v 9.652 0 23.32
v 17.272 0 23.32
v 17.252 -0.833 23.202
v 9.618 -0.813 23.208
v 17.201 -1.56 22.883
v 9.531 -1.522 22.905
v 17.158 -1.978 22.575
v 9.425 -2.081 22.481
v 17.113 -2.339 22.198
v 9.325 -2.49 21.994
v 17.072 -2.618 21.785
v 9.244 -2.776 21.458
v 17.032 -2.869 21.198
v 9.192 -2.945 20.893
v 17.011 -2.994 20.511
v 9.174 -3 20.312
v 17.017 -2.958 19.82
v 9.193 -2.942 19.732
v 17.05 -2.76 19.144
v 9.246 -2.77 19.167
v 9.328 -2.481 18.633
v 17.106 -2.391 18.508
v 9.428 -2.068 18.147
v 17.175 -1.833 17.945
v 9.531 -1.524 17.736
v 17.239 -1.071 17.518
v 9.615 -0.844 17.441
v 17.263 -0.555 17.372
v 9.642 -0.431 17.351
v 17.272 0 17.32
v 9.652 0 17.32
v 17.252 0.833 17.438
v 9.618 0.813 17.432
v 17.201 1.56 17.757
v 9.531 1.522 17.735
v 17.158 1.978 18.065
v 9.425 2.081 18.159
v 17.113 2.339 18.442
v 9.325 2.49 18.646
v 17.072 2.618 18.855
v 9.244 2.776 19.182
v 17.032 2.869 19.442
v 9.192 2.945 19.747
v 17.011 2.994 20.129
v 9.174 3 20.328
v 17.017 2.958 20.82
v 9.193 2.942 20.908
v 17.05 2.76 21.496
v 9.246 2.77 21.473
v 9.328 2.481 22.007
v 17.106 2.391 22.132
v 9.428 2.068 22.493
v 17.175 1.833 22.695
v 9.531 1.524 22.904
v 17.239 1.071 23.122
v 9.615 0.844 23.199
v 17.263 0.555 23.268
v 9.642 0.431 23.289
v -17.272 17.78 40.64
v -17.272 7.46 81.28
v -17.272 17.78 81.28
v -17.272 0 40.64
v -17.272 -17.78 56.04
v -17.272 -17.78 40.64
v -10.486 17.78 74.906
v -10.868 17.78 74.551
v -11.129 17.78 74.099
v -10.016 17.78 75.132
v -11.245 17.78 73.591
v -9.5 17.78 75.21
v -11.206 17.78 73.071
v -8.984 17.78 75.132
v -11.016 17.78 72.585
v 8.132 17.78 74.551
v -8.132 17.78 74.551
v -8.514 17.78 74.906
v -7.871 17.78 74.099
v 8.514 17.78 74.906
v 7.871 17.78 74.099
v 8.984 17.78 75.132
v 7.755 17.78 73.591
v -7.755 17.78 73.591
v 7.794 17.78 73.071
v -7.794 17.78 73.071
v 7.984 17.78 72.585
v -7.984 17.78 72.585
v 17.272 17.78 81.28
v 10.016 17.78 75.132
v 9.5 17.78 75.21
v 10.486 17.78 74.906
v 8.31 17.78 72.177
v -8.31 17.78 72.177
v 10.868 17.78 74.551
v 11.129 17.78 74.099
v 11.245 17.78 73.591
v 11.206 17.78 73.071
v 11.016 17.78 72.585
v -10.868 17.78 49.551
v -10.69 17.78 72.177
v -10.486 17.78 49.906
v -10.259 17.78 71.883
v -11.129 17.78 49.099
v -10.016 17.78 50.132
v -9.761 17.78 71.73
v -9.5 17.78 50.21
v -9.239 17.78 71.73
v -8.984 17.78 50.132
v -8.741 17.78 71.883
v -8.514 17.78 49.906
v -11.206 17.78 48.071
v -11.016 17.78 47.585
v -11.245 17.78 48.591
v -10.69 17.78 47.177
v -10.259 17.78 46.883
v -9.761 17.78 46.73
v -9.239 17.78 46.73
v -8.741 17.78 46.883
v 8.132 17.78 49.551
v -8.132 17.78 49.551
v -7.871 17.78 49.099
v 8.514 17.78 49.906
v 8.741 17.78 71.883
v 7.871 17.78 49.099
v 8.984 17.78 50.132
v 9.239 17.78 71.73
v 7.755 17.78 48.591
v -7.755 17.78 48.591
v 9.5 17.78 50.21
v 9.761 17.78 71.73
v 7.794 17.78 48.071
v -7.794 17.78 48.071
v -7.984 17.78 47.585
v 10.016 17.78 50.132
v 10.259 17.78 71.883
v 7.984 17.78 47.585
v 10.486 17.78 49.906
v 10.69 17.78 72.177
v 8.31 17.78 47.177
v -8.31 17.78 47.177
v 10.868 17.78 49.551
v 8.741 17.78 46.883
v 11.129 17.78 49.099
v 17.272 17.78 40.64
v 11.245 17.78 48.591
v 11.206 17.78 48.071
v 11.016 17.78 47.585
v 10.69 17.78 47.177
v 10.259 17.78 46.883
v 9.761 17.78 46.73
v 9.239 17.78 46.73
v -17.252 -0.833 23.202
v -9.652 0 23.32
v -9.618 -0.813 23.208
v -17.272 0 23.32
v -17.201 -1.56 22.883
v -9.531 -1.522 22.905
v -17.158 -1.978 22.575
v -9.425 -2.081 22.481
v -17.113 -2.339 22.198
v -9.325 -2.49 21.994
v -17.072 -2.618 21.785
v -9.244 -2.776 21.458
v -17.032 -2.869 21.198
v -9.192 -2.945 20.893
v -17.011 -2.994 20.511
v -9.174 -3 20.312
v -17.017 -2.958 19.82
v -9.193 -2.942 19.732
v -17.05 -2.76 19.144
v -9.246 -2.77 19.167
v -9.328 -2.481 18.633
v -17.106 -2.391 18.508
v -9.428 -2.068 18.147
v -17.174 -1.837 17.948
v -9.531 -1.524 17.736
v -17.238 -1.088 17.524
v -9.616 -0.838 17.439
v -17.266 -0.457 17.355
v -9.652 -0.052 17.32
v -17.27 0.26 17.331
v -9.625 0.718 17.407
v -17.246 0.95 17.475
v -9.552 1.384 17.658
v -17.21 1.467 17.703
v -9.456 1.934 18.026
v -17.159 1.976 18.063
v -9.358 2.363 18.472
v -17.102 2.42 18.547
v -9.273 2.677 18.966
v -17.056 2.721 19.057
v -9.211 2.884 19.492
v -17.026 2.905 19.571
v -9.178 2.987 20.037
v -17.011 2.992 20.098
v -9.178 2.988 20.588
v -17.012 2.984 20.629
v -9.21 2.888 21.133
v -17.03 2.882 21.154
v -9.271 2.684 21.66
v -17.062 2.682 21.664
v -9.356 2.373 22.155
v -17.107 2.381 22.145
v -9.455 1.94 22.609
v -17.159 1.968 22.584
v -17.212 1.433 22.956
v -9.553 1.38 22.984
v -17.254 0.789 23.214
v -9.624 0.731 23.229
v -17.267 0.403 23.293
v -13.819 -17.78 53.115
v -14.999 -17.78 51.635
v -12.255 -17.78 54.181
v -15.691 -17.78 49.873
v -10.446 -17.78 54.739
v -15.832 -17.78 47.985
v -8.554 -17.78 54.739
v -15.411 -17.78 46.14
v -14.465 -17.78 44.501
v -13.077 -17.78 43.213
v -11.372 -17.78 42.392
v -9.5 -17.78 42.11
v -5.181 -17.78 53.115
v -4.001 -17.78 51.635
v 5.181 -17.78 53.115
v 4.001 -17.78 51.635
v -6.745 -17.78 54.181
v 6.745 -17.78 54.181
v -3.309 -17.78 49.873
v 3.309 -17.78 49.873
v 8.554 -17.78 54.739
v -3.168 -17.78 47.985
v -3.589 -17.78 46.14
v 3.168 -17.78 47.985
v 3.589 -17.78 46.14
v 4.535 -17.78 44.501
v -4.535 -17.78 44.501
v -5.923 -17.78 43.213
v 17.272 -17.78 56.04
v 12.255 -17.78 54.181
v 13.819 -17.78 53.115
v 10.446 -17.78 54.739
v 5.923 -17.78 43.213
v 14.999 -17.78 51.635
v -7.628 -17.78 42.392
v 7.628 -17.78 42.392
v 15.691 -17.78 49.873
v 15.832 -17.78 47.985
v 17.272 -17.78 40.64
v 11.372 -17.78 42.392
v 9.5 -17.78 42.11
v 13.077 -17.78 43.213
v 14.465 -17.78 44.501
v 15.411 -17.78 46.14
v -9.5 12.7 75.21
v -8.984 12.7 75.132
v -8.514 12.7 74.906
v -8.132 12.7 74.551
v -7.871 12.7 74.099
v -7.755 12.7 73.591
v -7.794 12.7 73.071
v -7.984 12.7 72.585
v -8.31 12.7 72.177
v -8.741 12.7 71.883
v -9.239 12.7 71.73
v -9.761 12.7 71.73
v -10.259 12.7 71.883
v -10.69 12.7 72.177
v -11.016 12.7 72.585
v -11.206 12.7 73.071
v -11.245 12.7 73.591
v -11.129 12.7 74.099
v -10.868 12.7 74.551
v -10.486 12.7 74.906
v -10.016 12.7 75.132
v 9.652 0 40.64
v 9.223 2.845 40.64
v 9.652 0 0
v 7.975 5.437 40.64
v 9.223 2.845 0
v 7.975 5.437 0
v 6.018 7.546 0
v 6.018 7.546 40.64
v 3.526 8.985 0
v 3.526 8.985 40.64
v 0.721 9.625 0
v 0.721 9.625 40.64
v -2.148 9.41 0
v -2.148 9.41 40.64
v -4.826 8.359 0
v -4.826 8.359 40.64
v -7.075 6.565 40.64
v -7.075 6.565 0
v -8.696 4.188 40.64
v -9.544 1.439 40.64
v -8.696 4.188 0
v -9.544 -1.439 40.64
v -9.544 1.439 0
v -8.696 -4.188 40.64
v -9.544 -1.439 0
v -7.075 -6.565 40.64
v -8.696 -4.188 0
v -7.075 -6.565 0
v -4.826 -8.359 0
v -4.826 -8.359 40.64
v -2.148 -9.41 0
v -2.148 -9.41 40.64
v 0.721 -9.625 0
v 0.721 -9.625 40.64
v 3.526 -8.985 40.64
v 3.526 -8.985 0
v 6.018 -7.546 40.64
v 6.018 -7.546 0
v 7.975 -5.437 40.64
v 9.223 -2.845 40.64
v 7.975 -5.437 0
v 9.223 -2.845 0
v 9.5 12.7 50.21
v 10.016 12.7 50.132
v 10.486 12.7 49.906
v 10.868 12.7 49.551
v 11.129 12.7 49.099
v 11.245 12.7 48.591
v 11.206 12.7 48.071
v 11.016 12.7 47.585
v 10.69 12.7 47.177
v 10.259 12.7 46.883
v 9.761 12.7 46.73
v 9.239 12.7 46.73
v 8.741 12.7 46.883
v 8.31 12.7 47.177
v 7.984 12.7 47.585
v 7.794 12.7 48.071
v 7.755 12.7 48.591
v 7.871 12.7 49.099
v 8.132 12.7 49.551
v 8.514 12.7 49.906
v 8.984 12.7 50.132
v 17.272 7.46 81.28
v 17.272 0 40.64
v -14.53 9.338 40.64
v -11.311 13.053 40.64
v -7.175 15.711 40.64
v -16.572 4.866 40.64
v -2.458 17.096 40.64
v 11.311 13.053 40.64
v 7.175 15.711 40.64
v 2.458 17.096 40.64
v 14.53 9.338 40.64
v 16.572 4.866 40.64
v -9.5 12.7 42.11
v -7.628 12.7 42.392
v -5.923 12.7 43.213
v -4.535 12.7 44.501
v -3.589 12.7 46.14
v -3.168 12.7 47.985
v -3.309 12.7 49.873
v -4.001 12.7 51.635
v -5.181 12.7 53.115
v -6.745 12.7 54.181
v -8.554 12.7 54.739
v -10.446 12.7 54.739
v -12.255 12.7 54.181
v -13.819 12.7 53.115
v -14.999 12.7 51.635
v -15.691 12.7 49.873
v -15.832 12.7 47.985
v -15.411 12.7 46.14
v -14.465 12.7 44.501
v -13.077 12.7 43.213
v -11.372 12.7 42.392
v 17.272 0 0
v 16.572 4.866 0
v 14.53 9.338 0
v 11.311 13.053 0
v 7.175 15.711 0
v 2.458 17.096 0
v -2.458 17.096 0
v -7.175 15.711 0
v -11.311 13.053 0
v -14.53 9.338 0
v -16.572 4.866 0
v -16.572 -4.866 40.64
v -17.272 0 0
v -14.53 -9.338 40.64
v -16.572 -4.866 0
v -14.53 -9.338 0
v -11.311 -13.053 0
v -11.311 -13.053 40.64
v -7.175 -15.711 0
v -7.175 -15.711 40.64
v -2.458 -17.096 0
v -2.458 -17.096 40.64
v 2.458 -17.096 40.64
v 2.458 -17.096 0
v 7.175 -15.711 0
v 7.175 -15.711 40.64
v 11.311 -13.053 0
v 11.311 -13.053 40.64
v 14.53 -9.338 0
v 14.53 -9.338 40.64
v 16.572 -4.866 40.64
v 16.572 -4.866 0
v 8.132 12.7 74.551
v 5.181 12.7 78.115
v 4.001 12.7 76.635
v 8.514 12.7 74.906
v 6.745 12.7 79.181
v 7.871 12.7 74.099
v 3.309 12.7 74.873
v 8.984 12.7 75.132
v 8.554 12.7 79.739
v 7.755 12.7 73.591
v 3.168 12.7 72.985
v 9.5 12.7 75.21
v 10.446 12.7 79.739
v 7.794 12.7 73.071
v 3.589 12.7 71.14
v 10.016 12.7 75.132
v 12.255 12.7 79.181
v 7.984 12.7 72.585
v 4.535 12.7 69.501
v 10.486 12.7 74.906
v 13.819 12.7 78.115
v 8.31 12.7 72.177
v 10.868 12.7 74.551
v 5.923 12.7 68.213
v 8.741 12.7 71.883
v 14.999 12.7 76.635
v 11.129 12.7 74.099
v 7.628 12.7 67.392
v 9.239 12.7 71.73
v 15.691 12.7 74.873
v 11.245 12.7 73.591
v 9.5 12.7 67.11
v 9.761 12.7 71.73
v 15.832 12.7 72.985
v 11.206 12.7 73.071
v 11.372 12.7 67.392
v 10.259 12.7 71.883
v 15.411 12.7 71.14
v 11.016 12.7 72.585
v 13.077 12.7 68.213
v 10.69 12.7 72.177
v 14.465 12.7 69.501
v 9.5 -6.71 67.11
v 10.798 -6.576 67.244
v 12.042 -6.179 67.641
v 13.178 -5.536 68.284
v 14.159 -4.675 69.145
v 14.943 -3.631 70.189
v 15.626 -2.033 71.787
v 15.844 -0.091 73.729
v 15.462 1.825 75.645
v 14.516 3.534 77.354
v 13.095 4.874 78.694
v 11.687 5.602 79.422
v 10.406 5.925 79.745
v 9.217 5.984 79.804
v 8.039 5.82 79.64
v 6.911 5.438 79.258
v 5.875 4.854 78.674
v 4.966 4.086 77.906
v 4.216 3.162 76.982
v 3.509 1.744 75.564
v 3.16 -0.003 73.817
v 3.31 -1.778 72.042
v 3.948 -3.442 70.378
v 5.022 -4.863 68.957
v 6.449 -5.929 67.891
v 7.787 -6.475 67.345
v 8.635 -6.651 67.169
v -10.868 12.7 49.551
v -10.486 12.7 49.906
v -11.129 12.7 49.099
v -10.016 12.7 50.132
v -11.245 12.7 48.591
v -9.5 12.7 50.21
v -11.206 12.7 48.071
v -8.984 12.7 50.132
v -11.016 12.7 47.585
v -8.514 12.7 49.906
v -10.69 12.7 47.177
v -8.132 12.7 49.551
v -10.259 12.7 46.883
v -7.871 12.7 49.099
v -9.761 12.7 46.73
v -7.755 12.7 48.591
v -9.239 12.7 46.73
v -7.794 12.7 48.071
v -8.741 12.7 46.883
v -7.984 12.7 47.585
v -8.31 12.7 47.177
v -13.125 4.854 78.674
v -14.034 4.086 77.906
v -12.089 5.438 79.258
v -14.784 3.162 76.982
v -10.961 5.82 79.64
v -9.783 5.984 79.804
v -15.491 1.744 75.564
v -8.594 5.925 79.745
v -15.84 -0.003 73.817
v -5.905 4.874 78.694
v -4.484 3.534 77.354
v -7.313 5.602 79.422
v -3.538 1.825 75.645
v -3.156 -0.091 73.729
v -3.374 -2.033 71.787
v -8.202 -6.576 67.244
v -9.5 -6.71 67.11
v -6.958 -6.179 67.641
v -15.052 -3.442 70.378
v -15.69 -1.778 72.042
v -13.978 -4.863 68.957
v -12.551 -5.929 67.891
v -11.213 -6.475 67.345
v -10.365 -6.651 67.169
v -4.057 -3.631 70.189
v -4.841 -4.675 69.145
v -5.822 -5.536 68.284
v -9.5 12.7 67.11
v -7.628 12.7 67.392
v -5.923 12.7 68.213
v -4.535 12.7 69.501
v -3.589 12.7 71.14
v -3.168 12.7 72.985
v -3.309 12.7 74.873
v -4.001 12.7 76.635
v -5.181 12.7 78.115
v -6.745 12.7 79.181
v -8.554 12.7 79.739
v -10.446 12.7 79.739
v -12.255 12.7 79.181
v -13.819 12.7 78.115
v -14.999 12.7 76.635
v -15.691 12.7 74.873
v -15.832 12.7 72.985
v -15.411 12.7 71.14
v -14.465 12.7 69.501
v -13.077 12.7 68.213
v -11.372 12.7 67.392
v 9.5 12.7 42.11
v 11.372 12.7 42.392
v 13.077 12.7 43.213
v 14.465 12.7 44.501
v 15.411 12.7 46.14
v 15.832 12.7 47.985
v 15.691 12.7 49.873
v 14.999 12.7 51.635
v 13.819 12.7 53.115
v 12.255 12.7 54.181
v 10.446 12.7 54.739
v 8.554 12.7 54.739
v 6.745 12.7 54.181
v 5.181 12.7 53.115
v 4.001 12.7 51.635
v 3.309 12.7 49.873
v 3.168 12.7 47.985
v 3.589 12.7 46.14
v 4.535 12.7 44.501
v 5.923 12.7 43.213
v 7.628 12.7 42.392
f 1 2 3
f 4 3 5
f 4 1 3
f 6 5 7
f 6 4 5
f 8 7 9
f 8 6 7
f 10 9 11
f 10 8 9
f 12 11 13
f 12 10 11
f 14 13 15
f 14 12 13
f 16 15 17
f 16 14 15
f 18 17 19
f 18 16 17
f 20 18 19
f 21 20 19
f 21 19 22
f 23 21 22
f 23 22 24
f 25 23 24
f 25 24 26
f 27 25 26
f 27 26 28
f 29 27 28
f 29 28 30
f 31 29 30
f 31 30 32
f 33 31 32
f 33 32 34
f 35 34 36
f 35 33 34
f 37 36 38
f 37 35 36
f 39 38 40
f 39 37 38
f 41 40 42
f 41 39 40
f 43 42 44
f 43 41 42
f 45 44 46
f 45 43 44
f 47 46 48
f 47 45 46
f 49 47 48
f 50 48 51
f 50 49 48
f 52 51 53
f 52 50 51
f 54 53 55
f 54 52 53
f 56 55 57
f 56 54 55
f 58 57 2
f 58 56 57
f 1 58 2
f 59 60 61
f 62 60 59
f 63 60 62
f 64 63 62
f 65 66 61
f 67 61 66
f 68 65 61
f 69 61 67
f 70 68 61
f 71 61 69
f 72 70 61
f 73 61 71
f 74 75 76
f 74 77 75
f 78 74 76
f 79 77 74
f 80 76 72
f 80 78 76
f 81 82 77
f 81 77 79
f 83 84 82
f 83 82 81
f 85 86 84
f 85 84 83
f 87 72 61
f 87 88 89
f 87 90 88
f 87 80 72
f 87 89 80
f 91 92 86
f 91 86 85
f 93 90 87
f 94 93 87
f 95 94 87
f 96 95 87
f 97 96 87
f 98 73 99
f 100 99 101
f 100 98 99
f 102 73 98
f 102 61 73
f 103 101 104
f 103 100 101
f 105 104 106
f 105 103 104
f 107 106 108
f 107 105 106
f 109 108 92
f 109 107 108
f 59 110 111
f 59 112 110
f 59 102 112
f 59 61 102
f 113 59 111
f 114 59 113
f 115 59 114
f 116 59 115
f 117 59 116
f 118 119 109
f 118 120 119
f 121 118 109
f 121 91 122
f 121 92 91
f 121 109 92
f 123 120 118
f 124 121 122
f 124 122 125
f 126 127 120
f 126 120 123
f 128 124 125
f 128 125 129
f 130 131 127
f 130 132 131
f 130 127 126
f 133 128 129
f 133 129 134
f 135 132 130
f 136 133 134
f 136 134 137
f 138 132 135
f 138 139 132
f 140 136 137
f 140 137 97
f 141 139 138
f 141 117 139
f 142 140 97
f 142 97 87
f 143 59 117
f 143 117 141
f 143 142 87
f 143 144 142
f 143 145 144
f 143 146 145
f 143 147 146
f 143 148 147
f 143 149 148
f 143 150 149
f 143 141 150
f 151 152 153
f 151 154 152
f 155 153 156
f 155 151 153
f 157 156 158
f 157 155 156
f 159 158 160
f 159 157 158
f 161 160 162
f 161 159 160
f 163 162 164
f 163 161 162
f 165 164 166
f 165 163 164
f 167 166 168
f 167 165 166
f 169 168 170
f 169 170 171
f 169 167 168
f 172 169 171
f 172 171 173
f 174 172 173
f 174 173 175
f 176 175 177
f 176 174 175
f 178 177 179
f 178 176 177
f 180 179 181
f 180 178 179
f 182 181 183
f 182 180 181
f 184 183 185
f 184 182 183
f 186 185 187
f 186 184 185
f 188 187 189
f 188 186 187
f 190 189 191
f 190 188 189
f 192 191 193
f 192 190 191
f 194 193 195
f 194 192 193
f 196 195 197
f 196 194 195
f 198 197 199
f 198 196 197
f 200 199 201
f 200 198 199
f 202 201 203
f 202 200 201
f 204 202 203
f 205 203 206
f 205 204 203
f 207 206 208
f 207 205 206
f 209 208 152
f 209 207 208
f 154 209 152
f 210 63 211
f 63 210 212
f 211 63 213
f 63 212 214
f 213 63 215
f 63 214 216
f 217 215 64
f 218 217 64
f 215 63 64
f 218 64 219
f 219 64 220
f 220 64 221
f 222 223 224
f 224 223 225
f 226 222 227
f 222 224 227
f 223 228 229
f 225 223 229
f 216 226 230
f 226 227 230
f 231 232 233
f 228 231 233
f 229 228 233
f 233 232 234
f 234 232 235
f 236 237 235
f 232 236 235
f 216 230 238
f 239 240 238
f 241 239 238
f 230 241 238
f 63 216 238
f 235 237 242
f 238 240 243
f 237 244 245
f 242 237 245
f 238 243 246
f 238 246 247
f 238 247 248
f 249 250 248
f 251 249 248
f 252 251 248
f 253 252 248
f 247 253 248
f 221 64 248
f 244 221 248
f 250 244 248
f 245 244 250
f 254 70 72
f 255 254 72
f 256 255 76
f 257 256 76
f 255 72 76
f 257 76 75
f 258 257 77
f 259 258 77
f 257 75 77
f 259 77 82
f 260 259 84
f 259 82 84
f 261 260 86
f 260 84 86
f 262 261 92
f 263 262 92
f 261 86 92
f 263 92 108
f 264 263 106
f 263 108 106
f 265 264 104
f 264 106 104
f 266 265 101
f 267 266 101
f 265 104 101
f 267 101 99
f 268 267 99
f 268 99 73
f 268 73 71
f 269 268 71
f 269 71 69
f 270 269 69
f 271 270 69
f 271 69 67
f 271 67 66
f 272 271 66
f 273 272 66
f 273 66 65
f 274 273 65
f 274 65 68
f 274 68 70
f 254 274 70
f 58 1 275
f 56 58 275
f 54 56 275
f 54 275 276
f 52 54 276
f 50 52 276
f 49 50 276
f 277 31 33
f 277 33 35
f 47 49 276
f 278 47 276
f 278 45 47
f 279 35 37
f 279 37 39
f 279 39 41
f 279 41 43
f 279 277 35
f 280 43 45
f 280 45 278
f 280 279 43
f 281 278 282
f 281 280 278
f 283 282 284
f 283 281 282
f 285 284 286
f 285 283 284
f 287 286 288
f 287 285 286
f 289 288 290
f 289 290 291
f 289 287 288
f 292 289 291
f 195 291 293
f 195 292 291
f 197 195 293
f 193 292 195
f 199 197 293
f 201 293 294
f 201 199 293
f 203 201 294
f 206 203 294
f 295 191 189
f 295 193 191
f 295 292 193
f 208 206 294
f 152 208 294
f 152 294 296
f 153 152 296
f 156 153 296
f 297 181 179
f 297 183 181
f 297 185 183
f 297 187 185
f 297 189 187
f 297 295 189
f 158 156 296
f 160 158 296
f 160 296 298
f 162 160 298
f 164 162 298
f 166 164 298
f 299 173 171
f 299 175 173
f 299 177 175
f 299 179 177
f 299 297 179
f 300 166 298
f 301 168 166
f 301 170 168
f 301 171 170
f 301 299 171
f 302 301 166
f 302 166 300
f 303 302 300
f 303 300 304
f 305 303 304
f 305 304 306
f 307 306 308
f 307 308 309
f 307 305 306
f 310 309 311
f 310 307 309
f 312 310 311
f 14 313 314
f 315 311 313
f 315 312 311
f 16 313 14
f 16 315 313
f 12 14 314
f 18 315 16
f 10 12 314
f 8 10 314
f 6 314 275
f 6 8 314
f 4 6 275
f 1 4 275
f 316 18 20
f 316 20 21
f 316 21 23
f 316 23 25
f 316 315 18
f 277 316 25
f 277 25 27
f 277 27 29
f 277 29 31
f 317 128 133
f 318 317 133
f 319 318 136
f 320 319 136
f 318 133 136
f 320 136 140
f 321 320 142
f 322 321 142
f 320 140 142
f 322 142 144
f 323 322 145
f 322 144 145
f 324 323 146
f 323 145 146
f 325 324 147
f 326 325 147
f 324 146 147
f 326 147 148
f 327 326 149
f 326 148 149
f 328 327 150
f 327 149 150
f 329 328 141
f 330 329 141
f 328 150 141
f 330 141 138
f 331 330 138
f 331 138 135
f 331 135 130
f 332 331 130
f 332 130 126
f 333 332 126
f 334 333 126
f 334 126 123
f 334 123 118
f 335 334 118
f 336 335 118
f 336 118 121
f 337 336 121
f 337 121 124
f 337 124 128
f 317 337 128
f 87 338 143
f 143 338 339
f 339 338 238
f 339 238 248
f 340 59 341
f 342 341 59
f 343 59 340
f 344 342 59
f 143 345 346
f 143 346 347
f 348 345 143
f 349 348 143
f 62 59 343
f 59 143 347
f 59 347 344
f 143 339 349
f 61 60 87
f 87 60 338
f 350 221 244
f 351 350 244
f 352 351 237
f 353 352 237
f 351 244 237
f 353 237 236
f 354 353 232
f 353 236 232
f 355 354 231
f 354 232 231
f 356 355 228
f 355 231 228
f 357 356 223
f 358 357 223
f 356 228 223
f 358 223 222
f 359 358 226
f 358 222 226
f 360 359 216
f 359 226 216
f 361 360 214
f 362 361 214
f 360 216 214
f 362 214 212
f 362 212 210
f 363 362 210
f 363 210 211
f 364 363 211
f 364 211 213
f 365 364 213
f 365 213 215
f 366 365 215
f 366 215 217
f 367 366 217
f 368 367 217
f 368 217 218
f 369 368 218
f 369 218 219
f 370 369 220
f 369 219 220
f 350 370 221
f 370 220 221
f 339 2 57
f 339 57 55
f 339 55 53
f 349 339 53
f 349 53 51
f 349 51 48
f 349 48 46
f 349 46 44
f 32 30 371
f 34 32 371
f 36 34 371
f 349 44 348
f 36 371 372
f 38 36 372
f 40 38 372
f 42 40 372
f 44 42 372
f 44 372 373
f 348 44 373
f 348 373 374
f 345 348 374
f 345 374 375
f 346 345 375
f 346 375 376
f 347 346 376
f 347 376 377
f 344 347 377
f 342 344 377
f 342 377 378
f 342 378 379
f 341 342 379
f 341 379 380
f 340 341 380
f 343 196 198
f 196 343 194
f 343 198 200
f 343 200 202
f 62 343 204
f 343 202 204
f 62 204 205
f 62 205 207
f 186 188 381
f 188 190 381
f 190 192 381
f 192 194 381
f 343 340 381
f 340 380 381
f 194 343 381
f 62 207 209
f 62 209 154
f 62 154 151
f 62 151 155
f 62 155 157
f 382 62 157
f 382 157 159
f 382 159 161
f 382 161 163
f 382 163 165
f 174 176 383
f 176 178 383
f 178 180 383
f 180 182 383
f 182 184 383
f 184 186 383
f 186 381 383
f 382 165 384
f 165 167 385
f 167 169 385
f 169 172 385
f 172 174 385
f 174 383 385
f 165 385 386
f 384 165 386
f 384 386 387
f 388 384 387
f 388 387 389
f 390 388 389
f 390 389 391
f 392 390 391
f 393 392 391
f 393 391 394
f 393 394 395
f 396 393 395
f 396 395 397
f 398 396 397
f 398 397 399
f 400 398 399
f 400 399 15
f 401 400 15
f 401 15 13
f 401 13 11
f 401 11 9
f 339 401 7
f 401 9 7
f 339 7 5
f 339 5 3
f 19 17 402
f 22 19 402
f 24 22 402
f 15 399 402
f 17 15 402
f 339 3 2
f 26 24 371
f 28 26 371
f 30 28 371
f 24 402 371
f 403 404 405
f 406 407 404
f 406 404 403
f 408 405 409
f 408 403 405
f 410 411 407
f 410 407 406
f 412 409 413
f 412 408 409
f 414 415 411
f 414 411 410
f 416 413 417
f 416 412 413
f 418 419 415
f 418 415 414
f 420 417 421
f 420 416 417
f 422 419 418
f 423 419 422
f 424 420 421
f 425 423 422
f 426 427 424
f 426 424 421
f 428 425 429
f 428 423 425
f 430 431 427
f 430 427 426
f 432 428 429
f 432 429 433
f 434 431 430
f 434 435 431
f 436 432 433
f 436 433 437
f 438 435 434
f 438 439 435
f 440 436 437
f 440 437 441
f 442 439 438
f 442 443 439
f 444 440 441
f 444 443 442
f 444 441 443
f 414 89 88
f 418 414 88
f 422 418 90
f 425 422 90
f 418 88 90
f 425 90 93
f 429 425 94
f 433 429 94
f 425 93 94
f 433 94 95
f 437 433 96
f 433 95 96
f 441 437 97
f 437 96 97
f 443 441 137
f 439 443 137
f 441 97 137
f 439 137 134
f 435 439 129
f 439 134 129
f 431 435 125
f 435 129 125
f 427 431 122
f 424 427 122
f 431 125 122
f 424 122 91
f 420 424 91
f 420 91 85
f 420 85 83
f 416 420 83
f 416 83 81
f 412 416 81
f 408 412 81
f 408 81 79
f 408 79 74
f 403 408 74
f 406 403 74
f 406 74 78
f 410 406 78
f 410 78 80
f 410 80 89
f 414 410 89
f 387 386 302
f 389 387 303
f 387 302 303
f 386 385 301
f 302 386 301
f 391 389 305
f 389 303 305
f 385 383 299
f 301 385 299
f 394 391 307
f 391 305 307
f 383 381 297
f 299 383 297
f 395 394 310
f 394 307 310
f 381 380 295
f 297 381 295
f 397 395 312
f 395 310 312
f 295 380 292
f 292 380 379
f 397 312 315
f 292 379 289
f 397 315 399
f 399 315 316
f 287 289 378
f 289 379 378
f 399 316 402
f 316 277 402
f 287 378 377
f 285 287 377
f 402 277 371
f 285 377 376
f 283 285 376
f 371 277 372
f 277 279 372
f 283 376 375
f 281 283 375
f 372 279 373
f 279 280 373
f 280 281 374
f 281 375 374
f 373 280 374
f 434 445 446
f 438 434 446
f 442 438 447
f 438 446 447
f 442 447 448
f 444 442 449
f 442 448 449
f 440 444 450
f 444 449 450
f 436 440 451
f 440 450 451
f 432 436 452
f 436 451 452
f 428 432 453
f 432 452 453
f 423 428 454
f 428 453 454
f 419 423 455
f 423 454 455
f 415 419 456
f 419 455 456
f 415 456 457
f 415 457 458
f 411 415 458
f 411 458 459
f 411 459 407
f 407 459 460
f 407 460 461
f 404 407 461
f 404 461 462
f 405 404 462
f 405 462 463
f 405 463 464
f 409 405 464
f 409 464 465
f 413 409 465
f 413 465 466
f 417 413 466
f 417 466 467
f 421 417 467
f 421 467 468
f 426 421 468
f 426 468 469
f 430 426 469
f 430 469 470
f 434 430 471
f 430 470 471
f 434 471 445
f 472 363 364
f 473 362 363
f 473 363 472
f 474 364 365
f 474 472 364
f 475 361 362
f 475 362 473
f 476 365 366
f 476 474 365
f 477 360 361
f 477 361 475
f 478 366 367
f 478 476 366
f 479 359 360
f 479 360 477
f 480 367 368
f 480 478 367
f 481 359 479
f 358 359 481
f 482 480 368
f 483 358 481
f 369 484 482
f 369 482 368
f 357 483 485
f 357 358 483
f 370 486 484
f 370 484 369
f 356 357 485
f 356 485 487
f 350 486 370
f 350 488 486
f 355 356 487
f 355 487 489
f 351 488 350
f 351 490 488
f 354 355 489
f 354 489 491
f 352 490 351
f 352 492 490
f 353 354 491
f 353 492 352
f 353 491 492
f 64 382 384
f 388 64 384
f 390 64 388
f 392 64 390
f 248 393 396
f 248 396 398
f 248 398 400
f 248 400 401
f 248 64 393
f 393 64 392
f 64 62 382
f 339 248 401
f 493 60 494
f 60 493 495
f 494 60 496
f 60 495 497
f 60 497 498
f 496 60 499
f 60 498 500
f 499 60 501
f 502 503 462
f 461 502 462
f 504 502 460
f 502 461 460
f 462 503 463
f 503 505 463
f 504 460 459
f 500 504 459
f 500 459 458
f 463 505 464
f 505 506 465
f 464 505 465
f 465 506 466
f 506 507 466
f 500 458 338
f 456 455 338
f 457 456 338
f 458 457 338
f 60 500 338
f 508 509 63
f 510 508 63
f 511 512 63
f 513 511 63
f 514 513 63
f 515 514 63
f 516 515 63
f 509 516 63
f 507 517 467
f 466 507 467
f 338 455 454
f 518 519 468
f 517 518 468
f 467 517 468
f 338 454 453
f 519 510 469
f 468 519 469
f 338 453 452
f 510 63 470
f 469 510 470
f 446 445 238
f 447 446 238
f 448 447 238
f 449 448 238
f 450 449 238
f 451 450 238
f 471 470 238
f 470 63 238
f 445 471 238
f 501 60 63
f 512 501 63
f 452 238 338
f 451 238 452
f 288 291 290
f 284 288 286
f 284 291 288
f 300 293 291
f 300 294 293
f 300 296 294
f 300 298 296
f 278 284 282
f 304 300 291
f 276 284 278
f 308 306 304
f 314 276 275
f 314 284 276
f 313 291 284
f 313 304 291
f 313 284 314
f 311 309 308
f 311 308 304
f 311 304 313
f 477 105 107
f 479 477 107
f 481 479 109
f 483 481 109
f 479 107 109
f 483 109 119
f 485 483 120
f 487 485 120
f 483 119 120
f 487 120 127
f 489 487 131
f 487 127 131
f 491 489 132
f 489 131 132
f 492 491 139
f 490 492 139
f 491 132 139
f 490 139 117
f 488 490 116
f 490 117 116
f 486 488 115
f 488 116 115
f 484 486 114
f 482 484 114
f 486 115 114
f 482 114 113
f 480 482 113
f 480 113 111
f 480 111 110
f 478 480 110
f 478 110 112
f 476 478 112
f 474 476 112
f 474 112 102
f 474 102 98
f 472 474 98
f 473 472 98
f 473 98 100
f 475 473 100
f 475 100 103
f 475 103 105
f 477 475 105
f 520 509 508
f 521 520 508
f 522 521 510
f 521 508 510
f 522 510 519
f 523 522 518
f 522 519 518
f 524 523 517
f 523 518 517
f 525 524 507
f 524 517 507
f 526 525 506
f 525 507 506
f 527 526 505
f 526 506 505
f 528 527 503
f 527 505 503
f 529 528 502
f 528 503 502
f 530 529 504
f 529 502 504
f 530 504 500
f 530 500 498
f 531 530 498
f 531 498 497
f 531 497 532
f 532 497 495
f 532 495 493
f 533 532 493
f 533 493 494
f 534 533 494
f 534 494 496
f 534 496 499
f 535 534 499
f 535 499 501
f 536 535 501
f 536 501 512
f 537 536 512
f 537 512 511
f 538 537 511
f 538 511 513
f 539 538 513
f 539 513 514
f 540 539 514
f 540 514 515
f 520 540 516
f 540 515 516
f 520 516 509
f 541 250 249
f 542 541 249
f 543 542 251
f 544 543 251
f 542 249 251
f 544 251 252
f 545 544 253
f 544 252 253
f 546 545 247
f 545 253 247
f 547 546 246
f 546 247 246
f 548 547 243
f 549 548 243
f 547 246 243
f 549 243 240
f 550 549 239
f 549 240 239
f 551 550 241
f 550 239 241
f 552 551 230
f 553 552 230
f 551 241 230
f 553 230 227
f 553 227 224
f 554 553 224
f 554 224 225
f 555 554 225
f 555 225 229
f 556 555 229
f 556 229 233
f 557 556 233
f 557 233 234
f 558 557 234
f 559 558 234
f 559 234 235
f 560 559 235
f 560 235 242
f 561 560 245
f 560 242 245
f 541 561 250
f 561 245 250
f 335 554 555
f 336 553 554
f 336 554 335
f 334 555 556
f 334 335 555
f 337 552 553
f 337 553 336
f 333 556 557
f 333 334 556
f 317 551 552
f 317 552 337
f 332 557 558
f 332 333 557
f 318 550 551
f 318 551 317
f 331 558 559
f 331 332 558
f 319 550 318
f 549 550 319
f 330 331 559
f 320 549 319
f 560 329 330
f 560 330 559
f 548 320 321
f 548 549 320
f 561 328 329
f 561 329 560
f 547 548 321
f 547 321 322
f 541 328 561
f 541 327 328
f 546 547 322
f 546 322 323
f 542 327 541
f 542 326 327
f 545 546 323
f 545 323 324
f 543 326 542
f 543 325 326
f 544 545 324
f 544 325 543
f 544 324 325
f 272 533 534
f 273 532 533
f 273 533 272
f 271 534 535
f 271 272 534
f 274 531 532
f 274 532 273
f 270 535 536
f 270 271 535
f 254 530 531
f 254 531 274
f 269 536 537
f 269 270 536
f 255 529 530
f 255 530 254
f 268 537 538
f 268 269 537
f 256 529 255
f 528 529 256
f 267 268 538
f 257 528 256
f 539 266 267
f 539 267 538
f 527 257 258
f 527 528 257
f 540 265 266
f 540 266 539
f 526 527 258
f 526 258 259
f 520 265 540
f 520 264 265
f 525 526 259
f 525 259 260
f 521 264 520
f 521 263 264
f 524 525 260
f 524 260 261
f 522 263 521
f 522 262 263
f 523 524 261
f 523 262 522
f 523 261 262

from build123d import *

# Parameters (mm, degrees)
SKETCH1_R                = 17.272
SKETCH1_R_2              = 9.652
BOSS_EXTRUDE1_DEPTH      = 40.64
BOSS_EXTRUDE2_DEPTH      = 17.78
BOSS_EXTRUDE2_DEPTH_BACK = 17.78
SKETCH3_W                = 34.544
SKETCH3_H                = 40.64
CHAMFER1_SIZE            = 25.24
SKETCH5_R                = 1.75
CUT_EXTRUDE2_DEPTH       = 40.64
SKETCH7_R                = 6.35
CUT_EXTRUDE6_DEPTH       = 30.48
CUT_EXTRUDE7_DEPTH       = 30.48
CUT_EXTRUDE7_DEPTH_BACK  = 30.48
SKETCH8_R                = 3


with BuildPart() as part:
    # Sketch1 → Boss-Extrude1 (new body)
    with BuildSketch(Plane.XY):
        Circle(SKETCH1_R)
        Circle(SKETCH1_R_2, mode=Mode.SUBTRACT)
    extrude(amount=BOSS_EXTRUDE1_DEPTH)

    # Sketch3 → Boss-Extrude2 (add, two sides: drawn at the far end of the back side and taken through both)
    with BuildSketch(Plane(origin=(0, 0, 0), x_dir=(1, 0, 0), z_dir=(0, 1, 0)).offset(-BOSS_EXTRUDE2_DEPTH_BACK)):
        with Locations((0, -60.96)):
            Rectangle(SKETCH3_W, SKETCH3_H)
    extrude(amount=BOSS_EXTRUDE2_DEPTH + BOSS_EXTRUDE2_DEPTH_BACK)

    # Chamfer1
    chamfer1_edges = [part.edges().sort_by_distance(p)[0] for p in [
        (0, -17.78, 81.28),
    ]]
    chamfer(chamfer1_edges, length=CHAMFER1_SIZE)

    # Sketch5 → Cut-Extrude2 (cut)
    with BuildSketch(Plane(origin=(0, 17.78, 0), x_dir=(1, 0, 0), z_dir=(0, 1, 0))):
        with Locations(Location((-9.5, -48.46, 0), (0, 0, 270))):
            Circle(SKETCH5_R)
        with Locations(Location((9.5, -48.46, 0), (0, 0, 270))):
            Circle(SKETCH5_R)
        with Locations(Location((9.5, -73.46, 0), (0, 0, 270))):
            Circle(SKETCH5_R)
        with Locations(Location((-9.5, -73.46, 0), (0, 0, 270))):
            Circle(SKETCH5_R)
    extrude(amount=-CUT_EXTRUDE2_DEPTH, mode=Mode.SUBTRACT)

    # Sketch7 → Cut-Extrude6 (cut)
    with BuildSketch(Plane.XZ.offset(17.78)):
        with Locations(Location((-9.5, 73.46, 0), (0, 0, 270))):
            Circle(SKETCH7_R)
        with Locations(Location((9.5, 73.46, 0), (0, 0, 270))):
            Circle(SKETCH7_R)
        with Locations(Location((-9.5, 48.46, 0), (0, 0, 270))):
            Circle(SKETCH7_R)
        with Locations(Location((9.5, 48.46, 0), (0, 0, 270))):
            Circle(SKETCH7_R)
    extrude(amount=-CUT_EXTRUDE6_DEPTH, mode=Mode.SUBTRACT)

    # Sketch8 → Cut-Extrude7 (cut, two sides: drawn at the far end of the back side and taken through both)
    with BuildSketch(Plane(origin=(0, 0, 0), x_dir=(0, 0, -1), z_dir=(1, 0, 0)).offset(-CUT_EXTRUDE7_DEPTH_BACK)):
        with Locations(Location((-20.32, 0, 0), (0, 0, 180))):
            Circle(SKETCH8_R)
    extrude(amount=CUT_EXTRUDE7_DEPTH + CUT_EXTRUDE7_DEPTH_BACK, mode=Mode.SUBTRACT)


solid = part.part
